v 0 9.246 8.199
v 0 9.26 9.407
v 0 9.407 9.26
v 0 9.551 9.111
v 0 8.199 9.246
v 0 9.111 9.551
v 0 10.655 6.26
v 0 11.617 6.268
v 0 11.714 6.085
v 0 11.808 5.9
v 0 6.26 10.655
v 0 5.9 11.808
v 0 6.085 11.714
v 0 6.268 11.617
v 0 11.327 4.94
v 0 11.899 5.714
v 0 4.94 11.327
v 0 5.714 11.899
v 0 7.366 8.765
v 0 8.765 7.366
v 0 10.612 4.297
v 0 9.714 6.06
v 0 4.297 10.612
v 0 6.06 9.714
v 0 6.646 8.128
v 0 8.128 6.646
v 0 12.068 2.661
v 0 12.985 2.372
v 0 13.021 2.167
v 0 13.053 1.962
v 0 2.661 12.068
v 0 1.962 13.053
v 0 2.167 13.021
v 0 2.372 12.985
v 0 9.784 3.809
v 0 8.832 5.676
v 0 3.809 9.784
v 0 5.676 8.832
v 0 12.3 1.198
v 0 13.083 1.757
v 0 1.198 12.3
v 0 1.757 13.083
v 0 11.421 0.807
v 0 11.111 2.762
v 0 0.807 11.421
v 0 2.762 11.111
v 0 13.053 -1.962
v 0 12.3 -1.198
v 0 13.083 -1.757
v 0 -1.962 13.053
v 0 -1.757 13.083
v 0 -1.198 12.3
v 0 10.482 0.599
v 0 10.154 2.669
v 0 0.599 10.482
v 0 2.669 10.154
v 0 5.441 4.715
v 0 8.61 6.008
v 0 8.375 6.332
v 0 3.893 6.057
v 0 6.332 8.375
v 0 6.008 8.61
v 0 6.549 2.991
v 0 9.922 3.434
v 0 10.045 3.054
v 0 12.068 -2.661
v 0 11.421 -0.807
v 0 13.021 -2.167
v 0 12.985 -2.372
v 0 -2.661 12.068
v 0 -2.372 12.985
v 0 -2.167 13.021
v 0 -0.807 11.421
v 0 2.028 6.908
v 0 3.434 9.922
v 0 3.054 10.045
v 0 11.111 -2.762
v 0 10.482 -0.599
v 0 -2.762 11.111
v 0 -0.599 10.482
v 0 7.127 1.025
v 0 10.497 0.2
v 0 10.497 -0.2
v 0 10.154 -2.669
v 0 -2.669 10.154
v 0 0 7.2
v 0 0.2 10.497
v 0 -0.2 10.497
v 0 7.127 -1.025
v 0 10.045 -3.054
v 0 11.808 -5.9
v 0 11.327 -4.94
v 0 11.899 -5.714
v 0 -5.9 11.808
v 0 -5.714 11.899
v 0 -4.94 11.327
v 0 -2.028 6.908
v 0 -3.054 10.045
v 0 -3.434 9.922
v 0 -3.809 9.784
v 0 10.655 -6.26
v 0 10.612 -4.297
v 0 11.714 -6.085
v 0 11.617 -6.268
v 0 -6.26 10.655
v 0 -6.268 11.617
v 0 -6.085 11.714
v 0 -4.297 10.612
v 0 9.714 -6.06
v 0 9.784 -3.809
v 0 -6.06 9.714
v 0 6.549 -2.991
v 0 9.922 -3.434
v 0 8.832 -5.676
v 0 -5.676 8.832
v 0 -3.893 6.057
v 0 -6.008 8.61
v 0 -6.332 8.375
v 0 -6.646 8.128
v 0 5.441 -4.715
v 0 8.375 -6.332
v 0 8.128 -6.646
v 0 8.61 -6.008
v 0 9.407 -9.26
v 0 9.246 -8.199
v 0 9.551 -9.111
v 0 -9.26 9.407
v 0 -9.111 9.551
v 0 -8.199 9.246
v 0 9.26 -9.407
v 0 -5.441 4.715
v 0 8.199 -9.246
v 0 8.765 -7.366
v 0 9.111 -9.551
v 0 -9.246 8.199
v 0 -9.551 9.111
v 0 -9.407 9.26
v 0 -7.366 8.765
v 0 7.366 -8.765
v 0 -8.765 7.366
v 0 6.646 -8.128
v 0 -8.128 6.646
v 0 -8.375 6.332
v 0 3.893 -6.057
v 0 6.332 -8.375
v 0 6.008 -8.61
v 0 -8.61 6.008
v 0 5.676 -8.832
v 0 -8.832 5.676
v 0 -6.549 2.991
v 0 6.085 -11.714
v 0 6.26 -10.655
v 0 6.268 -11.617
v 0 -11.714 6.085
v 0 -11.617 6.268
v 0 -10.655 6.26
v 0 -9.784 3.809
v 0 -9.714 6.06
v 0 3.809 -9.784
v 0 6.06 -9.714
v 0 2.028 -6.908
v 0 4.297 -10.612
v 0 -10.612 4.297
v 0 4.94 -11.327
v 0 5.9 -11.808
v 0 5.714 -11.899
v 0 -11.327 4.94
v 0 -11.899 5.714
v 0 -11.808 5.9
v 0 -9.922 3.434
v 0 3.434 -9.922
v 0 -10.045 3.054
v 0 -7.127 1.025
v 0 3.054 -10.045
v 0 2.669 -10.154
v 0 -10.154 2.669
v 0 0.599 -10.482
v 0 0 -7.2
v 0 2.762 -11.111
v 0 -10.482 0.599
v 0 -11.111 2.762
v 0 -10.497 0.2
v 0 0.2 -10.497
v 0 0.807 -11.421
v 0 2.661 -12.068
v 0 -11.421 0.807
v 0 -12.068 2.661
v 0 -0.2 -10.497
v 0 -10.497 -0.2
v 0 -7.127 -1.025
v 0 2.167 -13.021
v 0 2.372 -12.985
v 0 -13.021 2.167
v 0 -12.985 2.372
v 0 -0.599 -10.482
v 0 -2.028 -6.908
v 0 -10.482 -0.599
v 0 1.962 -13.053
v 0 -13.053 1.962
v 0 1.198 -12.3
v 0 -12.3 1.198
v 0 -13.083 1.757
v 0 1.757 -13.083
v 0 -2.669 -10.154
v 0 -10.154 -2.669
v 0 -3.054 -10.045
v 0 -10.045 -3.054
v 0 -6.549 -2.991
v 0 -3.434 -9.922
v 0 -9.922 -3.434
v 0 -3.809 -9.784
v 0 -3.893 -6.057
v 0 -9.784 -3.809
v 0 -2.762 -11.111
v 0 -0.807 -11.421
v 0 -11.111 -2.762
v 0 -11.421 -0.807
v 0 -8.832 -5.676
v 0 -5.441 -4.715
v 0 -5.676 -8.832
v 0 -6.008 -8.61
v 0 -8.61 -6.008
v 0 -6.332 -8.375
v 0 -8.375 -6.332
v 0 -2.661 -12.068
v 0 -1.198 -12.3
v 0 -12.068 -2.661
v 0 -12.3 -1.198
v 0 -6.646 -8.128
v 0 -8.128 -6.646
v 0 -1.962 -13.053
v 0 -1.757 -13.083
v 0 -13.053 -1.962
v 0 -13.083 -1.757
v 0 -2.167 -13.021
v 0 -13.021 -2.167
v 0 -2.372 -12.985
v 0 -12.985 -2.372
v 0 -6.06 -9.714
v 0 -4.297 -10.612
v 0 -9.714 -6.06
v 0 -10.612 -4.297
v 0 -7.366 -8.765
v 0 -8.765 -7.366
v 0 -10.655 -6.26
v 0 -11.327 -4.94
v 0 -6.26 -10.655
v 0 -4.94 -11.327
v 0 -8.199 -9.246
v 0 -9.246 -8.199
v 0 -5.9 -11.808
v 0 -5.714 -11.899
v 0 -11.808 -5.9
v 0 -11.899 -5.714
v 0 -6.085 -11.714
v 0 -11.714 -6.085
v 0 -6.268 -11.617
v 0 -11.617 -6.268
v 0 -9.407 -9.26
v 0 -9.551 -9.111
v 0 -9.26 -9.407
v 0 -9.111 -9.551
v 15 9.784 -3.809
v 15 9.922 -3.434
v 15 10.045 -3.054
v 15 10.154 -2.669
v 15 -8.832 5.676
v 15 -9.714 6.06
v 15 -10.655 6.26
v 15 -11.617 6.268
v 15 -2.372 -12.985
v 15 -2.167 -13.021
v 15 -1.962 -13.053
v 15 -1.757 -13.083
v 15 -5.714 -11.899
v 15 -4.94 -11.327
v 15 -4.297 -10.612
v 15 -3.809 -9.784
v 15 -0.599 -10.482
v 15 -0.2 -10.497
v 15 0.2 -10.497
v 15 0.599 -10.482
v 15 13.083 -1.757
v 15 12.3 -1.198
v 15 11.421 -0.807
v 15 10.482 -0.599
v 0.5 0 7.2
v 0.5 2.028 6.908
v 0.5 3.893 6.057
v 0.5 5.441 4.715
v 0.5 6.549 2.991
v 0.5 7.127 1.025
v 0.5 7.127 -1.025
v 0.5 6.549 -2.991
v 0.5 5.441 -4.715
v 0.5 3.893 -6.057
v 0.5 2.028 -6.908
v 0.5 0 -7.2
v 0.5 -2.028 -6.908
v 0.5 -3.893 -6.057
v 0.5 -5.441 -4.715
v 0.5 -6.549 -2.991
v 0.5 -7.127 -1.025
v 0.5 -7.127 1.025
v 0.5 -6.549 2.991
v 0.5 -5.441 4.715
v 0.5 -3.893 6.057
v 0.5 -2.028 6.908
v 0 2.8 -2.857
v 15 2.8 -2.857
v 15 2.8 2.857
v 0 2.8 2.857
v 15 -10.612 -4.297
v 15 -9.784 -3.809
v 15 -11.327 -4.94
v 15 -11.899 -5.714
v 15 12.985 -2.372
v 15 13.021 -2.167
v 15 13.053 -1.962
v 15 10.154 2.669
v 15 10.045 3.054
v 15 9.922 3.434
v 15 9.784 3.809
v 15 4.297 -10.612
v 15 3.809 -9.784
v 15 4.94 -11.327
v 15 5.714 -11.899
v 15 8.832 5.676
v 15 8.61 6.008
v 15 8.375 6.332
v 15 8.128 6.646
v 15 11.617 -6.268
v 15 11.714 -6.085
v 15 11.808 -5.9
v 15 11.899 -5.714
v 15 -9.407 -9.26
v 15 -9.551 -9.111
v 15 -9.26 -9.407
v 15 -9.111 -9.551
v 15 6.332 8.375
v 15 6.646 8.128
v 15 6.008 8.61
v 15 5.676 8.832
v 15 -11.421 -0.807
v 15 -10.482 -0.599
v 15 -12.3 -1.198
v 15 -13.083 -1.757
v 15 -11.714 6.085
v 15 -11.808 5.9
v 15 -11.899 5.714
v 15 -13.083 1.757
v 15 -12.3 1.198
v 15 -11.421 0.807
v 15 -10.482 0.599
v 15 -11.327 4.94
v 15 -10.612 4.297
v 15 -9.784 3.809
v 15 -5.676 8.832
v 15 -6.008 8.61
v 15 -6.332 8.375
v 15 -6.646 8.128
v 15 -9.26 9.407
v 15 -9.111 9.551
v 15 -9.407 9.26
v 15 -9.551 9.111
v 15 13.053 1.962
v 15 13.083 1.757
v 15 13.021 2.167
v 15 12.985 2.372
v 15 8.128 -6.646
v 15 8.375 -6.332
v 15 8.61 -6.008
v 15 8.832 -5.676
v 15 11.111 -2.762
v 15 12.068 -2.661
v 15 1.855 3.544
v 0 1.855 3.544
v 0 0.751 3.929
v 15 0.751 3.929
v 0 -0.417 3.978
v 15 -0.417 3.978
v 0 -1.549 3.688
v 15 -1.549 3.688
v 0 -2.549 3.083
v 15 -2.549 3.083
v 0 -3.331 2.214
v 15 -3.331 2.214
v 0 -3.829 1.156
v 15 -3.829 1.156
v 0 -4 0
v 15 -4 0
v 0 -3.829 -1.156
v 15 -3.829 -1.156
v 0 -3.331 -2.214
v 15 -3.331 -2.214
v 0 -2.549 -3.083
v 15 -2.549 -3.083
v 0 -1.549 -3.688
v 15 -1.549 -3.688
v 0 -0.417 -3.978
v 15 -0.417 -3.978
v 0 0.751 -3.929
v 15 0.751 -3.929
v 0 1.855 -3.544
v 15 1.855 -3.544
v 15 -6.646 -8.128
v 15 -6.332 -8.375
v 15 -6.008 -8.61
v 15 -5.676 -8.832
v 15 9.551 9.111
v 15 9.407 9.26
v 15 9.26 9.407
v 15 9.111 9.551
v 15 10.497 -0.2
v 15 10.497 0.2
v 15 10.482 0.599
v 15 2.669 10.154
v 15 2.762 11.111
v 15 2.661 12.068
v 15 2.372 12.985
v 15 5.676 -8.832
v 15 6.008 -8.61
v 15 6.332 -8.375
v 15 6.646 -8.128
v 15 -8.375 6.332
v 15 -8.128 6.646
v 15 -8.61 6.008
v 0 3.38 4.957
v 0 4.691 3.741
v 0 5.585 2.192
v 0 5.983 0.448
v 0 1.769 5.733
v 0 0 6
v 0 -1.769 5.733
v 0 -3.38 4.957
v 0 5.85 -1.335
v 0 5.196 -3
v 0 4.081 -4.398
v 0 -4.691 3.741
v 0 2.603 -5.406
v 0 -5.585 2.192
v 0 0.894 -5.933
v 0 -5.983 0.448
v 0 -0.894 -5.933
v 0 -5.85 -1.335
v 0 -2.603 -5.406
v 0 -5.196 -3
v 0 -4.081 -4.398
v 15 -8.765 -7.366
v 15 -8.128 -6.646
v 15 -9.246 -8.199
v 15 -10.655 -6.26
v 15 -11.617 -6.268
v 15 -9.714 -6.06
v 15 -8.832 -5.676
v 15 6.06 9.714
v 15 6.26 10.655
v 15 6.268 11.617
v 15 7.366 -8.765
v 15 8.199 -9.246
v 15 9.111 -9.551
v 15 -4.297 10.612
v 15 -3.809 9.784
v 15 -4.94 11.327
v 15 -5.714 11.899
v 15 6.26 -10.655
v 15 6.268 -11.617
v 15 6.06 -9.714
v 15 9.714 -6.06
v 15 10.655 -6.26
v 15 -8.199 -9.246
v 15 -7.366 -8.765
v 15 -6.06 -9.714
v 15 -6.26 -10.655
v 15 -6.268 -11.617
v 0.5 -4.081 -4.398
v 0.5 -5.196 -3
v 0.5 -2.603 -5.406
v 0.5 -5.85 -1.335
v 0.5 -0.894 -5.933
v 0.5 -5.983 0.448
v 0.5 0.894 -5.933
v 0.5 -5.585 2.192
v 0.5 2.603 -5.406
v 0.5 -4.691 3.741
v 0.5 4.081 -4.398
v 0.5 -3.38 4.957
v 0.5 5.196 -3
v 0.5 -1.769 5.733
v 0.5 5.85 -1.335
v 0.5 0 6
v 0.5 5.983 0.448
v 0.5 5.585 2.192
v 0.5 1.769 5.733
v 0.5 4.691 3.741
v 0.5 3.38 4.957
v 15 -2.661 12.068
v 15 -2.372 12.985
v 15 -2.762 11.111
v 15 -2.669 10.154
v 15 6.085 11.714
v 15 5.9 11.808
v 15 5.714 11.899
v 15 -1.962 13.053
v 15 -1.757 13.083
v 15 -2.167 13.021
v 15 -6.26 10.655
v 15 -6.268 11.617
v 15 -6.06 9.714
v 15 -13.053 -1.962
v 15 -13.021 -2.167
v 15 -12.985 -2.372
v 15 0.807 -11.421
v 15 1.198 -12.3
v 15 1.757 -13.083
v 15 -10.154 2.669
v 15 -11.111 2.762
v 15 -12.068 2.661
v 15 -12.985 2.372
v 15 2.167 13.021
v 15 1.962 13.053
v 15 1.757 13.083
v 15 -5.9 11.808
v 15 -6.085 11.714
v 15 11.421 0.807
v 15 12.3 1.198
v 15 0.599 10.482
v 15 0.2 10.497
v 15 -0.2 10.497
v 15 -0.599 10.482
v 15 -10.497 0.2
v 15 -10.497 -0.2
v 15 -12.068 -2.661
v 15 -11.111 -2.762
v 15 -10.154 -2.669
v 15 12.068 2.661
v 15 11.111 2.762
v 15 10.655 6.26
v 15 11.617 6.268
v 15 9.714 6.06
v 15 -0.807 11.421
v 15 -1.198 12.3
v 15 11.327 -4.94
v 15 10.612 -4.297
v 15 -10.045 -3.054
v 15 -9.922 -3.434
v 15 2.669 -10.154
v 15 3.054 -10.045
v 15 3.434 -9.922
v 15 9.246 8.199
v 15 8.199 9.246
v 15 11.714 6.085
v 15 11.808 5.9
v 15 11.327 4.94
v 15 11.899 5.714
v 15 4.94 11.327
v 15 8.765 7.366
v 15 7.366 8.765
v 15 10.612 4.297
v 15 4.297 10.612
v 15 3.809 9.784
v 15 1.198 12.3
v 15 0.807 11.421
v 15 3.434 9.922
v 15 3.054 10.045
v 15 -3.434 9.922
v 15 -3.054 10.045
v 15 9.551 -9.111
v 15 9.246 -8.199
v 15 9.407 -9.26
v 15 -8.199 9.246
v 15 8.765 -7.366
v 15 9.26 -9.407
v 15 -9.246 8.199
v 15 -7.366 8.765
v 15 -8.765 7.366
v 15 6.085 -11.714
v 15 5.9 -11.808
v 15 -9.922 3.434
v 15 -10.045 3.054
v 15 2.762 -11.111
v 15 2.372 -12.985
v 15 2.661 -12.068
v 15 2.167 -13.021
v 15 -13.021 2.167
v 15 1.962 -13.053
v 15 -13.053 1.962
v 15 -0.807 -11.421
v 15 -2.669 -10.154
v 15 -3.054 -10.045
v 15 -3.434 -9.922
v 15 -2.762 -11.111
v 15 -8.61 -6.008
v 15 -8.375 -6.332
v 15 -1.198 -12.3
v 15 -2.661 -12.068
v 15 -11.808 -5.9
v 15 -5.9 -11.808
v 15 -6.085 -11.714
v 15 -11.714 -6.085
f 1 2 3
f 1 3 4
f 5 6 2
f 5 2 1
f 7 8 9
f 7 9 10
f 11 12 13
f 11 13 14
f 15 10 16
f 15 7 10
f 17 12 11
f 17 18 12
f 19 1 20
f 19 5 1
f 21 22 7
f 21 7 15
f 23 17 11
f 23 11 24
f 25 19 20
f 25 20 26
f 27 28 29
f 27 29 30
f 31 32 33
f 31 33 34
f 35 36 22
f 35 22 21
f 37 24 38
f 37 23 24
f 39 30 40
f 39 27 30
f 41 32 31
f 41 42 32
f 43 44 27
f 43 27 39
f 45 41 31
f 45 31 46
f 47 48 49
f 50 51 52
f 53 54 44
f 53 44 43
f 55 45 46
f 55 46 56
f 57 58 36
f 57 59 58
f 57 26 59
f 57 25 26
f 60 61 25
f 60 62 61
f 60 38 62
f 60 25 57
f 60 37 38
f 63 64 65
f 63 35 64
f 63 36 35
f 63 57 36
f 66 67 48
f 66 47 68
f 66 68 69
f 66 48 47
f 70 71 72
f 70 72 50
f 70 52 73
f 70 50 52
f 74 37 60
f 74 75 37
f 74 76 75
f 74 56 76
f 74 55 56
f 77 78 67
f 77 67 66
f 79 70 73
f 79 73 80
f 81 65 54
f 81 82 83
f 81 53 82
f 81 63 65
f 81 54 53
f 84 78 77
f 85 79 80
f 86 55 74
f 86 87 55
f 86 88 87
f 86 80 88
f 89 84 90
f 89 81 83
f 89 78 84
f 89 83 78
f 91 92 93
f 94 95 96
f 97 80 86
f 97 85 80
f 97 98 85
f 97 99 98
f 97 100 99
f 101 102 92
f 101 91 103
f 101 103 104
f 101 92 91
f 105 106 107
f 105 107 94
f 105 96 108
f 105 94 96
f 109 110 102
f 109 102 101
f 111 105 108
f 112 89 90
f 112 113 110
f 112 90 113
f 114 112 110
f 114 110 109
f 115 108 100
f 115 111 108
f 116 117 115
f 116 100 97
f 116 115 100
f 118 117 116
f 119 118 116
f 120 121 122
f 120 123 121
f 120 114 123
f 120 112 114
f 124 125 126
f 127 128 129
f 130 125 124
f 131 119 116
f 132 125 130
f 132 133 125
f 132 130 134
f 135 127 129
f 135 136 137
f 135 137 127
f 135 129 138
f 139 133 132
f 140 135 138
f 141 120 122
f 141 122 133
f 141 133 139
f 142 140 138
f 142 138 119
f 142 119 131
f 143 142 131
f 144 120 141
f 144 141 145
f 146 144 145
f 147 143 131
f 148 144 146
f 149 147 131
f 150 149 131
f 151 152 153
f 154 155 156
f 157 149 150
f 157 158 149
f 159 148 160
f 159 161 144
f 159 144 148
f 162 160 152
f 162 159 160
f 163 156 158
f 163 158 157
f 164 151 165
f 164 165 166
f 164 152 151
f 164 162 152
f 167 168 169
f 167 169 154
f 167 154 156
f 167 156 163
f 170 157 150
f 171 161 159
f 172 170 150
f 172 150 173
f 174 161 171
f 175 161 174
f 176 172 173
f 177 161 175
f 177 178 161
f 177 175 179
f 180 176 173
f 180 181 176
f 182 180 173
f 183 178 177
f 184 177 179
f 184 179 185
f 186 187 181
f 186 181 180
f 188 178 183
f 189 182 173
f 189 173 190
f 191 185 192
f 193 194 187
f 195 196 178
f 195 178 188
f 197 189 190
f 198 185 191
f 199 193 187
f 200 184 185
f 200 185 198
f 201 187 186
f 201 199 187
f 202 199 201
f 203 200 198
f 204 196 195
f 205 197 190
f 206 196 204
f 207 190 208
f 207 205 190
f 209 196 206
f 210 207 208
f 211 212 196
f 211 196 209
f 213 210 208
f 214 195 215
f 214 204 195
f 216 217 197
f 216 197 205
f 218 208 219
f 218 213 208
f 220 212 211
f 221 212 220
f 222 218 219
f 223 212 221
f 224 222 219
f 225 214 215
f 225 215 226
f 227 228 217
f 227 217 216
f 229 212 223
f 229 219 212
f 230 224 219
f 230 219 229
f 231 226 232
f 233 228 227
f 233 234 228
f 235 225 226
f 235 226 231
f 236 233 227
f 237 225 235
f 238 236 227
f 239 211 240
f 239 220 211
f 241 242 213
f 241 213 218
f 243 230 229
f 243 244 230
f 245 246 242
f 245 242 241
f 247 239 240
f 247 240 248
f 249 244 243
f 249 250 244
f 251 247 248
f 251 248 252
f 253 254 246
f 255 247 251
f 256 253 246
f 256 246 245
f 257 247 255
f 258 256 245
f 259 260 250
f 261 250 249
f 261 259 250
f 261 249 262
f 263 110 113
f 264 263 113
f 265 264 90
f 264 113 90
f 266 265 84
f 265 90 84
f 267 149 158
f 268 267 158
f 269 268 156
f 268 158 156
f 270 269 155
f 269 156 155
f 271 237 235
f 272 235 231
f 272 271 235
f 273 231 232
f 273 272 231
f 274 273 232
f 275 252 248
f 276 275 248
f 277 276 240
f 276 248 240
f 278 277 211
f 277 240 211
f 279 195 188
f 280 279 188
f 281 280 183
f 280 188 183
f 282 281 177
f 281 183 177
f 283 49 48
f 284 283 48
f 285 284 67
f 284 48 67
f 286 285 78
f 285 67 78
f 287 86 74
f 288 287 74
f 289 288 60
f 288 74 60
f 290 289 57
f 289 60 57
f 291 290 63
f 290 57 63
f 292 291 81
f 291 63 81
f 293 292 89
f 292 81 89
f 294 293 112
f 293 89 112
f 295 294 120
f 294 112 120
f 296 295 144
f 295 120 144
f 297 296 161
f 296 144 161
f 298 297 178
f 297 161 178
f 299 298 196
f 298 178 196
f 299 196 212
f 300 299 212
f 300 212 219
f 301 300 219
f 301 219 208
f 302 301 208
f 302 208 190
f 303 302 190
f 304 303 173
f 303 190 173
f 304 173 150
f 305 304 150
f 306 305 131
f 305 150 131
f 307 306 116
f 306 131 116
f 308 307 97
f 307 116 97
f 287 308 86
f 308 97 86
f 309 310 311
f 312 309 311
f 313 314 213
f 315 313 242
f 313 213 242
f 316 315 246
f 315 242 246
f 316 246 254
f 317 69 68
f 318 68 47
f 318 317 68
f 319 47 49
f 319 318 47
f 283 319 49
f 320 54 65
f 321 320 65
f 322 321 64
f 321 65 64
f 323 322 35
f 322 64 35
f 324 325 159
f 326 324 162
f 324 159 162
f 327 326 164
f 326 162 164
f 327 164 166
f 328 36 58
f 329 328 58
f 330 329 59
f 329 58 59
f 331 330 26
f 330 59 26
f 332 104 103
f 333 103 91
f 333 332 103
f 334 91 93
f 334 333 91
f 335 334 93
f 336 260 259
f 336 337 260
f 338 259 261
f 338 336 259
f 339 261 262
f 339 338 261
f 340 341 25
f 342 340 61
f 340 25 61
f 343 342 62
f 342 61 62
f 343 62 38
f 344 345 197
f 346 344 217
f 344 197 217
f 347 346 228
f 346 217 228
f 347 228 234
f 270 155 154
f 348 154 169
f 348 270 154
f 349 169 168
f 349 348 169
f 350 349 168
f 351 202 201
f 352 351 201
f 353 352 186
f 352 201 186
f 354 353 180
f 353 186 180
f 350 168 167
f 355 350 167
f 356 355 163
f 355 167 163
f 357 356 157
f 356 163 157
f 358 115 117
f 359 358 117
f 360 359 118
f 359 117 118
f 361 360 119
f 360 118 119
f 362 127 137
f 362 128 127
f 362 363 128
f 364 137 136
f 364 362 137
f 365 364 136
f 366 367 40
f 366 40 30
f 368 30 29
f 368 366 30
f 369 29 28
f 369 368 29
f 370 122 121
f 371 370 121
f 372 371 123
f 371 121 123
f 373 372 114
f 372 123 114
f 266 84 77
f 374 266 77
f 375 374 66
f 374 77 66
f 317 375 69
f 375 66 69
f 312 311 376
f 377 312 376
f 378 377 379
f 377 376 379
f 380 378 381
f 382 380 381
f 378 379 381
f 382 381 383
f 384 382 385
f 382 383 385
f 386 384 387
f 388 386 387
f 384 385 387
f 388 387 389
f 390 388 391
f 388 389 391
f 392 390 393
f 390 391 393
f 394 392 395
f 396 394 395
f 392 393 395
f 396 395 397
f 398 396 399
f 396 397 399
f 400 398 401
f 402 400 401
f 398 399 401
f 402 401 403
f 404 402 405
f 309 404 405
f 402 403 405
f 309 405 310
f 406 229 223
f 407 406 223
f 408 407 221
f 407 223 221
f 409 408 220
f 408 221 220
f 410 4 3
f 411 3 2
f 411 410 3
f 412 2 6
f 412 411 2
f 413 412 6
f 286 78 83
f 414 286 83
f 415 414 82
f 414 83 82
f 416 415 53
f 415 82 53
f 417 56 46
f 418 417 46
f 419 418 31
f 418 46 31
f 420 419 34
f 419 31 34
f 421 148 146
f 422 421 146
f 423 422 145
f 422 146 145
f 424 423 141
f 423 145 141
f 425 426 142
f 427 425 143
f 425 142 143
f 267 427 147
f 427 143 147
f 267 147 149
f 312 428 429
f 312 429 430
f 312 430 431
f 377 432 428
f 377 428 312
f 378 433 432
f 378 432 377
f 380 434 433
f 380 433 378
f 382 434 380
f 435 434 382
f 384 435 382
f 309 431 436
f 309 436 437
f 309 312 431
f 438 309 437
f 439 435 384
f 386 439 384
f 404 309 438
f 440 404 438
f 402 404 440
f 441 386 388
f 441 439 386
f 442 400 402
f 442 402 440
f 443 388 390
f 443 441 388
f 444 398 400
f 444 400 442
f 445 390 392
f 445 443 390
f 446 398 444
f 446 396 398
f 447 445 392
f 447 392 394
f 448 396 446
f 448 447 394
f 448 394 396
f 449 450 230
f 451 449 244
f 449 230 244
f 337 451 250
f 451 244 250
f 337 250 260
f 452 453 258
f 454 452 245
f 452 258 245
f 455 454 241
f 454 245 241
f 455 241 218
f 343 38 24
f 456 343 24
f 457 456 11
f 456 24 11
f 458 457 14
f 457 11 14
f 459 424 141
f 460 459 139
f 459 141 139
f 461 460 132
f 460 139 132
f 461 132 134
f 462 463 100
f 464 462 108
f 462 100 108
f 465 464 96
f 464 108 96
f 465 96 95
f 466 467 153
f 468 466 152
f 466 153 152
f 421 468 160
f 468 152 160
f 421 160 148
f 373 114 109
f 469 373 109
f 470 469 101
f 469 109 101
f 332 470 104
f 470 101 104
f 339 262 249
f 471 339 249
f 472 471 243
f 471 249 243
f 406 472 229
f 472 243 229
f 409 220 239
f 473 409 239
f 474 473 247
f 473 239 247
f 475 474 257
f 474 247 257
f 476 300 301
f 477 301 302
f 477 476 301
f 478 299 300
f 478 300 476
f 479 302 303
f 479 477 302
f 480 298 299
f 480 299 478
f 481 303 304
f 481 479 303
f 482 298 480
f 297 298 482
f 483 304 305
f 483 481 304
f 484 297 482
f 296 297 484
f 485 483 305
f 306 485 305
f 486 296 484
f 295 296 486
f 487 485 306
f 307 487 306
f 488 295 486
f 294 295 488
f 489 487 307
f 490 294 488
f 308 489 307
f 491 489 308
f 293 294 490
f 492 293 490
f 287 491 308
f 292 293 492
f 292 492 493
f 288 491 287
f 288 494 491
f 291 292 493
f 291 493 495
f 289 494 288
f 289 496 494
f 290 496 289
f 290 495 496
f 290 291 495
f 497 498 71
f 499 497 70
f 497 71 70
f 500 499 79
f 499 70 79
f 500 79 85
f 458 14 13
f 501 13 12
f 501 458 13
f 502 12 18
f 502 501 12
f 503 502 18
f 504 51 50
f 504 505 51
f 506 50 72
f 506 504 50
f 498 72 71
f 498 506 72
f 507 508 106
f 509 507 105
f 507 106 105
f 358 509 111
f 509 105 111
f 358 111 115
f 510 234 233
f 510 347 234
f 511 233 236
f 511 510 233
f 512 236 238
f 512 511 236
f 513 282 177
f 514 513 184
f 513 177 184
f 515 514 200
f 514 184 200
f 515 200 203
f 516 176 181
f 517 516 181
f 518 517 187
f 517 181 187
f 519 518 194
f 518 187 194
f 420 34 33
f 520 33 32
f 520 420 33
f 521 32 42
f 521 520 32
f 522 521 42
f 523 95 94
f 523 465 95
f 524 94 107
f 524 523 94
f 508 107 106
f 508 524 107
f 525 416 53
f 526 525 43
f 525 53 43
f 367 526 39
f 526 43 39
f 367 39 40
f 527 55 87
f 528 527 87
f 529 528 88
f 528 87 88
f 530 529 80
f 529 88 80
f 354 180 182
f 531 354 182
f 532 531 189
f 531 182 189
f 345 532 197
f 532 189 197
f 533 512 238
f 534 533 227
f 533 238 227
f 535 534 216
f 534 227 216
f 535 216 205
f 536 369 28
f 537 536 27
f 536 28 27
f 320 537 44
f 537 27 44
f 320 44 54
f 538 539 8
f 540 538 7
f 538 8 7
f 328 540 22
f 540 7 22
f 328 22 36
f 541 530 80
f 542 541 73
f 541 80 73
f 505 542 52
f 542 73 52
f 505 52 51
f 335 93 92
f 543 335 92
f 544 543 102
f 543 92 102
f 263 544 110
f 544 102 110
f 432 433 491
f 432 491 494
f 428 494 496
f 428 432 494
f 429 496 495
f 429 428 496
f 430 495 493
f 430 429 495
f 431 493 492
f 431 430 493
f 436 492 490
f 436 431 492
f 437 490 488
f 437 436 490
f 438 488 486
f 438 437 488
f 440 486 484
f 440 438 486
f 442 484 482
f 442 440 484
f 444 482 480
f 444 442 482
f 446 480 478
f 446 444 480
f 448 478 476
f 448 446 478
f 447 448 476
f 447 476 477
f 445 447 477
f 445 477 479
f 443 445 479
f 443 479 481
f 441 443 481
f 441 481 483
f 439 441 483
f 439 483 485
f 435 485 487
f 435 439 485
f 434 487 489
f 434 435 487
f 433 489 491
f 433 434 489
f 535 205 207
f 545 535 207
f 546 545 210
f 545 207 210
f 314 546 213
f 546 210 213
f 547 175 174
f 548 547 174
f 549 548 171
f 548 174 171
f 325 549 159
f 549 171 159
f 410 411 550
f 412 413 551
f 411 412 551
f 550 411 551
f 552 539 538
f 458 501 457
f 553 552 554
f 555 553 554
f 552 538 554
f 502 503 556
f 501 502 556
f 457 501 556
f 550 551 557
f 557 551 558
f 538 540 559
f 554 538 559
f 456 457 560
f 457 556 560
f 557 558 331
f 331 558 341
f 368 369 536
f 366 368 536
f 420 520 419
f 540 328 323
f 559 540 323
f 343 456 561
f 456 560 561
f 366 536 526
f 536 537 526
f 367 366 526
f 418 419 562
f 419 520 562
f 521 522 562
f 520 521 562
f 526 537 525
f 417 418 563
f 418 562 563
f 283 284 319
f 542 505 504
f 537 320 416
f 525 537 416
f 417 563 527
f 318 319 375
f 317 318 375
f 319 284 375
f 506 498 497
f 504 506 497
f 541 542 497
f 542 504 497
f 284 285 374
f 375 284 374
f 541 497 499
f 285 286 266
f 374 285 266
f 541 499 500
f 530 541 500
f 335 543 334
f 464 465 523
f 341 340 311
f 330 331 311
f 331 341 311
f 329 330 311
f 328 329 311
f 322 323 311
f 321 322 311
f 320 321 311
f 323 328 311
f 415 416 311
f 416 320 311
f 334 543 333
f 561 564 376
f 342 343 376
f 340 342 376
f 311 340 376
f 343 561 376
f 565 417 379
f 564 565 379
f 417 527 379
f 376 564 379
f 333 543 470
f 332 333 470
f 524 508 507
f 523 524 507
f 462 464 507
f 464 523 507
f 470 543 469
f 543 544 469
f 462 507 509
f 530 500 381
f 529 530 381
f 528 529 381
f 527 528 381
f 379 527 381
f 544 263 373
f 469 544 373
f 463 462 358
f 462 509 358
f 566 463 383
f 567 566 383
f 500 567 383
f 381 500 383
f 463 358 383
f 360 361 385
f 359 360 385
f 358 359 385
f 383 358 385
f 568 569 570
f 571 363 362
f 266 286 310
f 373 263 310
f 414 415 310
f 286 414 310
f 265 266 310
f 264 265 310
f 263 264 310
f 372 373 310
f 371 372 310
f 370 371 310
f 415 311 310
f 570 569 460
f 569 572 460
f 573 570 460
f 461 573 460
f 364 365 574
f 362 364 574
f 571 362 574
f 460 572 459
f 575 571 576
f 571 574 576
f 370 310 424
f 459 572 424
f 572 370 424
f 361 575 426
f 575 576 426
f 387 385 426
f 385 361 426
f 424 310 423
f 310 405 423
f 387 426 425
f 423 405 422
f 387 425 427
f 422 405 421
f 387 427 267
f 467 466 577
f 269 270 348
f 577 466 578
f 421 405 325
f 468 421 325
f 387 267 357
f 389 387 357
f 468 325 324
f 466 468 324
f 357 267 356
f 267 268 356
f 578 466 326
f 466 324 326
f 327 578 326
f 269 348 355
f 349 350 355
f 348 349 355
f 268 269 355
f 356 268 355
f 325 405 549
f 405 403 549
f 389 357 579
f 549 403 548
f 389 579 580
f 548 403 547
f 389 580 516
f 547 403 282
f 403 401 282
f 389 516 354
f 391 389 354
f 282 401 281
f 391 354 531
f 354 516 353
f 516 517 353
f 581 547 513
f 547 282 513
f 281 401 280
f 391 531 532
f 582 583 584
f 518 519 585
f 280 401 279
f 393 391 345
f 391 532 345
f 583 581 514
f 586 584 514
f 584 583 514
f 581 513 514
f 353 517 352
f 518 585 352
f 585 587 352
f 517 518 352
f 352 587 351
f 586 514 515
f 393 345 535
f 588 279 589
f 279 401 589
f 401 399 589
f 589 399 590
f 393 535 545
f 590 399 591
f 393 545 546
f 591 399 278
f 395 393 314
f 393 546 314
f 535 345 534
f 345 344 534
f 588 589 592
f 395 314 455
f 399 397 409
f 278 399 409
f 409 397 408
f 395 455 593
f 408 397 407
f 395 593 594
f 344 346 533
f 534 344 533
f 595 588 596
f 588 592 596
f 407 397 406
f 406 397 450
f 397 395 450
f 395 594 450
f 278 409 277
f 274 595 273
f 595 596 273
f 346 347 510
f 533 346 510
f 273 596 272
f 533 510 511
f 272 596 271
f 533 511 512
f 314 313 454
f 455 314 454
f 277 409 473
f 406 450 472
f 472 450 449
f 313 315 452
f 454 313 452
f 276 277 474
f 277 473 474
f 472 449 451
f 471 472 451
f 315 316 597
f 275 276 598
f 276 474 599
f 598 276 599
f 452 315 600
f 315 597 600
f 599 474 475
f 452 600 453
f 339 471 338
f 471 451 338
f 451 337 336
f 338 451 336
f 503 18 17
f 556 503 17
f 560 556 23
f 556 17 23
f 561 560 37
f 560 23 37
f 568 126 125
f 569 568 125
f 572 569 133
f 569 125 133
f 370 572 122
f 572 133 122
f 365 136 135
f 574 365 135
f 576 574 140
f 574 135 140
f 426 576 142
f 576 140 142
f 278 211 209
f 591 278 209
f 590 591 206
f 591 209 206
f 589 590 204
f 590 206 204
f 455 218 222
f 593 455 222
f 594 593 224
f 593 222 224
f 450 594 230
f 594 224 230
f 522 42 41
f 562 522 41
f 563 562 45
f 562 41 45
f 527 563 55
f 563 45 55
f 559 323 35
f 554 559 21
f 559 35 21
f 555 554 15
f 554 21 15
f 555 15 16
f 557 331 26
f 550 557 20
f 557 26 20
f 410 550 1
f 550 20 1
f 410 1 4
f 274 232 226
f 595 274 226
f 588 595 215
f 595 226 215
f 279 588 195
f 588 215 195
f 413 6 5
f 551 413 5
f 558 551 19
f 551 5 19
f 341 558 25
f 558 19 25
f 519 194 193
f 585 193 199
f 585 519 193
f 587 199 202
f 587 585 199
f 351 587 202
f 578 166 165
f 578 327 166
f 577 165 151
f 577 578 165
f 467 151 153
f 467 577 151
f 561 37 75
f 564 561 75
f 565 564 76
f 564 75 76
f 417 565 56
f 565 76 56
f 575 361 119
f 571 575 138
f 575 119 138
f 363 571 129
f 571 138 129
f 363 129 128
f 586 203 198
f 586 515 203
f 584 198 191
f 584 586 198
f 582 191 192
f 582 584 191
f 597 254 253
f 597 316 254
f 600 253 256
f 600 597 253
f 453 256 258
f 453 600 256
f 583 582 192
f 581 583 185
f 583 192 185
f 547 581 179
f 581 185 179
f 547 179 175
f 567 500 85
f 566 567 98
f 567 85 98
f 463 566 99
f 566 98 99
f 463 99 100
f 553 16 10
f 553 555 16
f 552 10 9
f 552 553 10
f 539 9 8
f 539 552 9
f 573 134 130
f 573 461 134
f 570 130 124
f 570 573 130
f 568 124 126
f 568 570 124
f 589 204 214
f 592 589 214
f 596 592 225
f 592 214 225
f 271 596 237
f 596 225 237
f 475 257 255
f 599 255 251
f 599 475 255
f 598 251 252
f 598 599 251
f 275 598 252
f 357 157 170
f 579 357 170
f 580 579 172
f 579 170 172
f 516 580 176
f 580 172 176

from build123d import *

# Parameters (mm, degrees)
BASPROSKE_W         = 15
BASPROSKE_H         = 13.2
TOOTHCUT_DEPTH      = 24.947442452
TEETHCUTS_COUNT     = 20
TEETHCUTS_ANGLE     = 342
BORSKE_R            = 4
BORE_DEPTH          = 50.0000508
BOSS_EXTRUDE1_START = -15
BOSS_EXTRUDE1_DEPTH = 15
SKETCH2_R           = 7.2
SKETCH2_R_2         = 6
CUT_EXTRUDE1_DEPTH  = 0.5


with BuildPart() as part:
    # BasProSke → Base-Revolve (revolve)
    with BuildSketch(Plane(origin=(0, 0, 0), x_dir=(1, 0, 0), z_dir=(0, 1, 0)), mode=Mode.PRIVATE) as base_revolve_sk:
        with Locations((7.5, 6.6)):
            Rectangle(BASPROSKE_W, BASPROSKE_H)
    revolve(base_revolve_sk.sketch.rotate(Axis((-10, 0, 0), (1, 0, 0)), 180), axis=Axis((-10, 0, 0), (1, 0, 0)))

    # TooCutSke → ToothCut (cut, through all)
    with BuildSketch(Plane(origin=(0, 0, 0), x_dir=(0, 0, -1), z_dir=(1, 0, 0))):
        with BuildLine():
            ThreePointArc((0.599012827, 10.48189795), (0, 10.499), (-0.599012827, 10.48189795))
            ThreePointArc((-0.599012827, 10.48189795), (-0.986906343, 11.883983562), (-1.777012823, 13.105473306))
            ThreePointArc((-1.777012823, 13.105473306), (0, 13.2254), (1.777012823, 13.105473306))
            ThreePointArc((1.777012823, 13.105473306), (0.986906343, 11.883983562), (0.599012827, 10.48189795))
        make_face()
    toothcut = extrude(amount=TOOTHCUT_DEPTH, mode=Mode.SUBTRACT)

    # TeethCuts: ToothCut ×20 about axis
    teethcuts_axis = Axis((-10, 0, 0), (1, 0, 0))
    for i in range(1, TEETHCUTS_COUNT):
        add(toothcut.rotate(teethcuts_axis, i * TEETHCUTS_ANGLE / (TEETHCUTS_COUNT - 1)), mode=Mode.SUBTRACT)

    # BorSke → Bore (cut, symmetric)
    with BuildSketch(Plane(origin=(0, 0, 0), x_dir=(0, 0, -1), z_dir=(1, 0, 0))):
        with Locations(Location((0, 0, 0), (0, 0, 180))):
            Circle(BORSKE_R)
    extrude(amount=BORE_DEPTH, both=True, mode=Mode.SUBTRACT)

    # Sketch1 → Boss-Extrude1 (add)
    with BuildSketch(Plane.ZY.offset(BOSS_EXTRUDE1_START)):
        with BuildLine():
            Line((-2.856571371, 2.8), (2.856571371, 2.8))
            ThreePointArc((2.856571371, 2.8), (0, 4), (-2.856571371, 2.8))
        make_face()
    extrude(amount=BOSS_EXTRUDE1_DEPTH)

    # Sketch2 → Cut-Extrude1 (cut)
    with BuildSketch(Plane.ZY):
        Circle(SKETCH2_R)
        Circle(SKETCH2_R_2, mode=Mode.SUBTRACT)
    extrude(amount=-CUT_EXTRUDE1_DEPTH, mode=Mode.SUBTRACT)


solid = part.part
